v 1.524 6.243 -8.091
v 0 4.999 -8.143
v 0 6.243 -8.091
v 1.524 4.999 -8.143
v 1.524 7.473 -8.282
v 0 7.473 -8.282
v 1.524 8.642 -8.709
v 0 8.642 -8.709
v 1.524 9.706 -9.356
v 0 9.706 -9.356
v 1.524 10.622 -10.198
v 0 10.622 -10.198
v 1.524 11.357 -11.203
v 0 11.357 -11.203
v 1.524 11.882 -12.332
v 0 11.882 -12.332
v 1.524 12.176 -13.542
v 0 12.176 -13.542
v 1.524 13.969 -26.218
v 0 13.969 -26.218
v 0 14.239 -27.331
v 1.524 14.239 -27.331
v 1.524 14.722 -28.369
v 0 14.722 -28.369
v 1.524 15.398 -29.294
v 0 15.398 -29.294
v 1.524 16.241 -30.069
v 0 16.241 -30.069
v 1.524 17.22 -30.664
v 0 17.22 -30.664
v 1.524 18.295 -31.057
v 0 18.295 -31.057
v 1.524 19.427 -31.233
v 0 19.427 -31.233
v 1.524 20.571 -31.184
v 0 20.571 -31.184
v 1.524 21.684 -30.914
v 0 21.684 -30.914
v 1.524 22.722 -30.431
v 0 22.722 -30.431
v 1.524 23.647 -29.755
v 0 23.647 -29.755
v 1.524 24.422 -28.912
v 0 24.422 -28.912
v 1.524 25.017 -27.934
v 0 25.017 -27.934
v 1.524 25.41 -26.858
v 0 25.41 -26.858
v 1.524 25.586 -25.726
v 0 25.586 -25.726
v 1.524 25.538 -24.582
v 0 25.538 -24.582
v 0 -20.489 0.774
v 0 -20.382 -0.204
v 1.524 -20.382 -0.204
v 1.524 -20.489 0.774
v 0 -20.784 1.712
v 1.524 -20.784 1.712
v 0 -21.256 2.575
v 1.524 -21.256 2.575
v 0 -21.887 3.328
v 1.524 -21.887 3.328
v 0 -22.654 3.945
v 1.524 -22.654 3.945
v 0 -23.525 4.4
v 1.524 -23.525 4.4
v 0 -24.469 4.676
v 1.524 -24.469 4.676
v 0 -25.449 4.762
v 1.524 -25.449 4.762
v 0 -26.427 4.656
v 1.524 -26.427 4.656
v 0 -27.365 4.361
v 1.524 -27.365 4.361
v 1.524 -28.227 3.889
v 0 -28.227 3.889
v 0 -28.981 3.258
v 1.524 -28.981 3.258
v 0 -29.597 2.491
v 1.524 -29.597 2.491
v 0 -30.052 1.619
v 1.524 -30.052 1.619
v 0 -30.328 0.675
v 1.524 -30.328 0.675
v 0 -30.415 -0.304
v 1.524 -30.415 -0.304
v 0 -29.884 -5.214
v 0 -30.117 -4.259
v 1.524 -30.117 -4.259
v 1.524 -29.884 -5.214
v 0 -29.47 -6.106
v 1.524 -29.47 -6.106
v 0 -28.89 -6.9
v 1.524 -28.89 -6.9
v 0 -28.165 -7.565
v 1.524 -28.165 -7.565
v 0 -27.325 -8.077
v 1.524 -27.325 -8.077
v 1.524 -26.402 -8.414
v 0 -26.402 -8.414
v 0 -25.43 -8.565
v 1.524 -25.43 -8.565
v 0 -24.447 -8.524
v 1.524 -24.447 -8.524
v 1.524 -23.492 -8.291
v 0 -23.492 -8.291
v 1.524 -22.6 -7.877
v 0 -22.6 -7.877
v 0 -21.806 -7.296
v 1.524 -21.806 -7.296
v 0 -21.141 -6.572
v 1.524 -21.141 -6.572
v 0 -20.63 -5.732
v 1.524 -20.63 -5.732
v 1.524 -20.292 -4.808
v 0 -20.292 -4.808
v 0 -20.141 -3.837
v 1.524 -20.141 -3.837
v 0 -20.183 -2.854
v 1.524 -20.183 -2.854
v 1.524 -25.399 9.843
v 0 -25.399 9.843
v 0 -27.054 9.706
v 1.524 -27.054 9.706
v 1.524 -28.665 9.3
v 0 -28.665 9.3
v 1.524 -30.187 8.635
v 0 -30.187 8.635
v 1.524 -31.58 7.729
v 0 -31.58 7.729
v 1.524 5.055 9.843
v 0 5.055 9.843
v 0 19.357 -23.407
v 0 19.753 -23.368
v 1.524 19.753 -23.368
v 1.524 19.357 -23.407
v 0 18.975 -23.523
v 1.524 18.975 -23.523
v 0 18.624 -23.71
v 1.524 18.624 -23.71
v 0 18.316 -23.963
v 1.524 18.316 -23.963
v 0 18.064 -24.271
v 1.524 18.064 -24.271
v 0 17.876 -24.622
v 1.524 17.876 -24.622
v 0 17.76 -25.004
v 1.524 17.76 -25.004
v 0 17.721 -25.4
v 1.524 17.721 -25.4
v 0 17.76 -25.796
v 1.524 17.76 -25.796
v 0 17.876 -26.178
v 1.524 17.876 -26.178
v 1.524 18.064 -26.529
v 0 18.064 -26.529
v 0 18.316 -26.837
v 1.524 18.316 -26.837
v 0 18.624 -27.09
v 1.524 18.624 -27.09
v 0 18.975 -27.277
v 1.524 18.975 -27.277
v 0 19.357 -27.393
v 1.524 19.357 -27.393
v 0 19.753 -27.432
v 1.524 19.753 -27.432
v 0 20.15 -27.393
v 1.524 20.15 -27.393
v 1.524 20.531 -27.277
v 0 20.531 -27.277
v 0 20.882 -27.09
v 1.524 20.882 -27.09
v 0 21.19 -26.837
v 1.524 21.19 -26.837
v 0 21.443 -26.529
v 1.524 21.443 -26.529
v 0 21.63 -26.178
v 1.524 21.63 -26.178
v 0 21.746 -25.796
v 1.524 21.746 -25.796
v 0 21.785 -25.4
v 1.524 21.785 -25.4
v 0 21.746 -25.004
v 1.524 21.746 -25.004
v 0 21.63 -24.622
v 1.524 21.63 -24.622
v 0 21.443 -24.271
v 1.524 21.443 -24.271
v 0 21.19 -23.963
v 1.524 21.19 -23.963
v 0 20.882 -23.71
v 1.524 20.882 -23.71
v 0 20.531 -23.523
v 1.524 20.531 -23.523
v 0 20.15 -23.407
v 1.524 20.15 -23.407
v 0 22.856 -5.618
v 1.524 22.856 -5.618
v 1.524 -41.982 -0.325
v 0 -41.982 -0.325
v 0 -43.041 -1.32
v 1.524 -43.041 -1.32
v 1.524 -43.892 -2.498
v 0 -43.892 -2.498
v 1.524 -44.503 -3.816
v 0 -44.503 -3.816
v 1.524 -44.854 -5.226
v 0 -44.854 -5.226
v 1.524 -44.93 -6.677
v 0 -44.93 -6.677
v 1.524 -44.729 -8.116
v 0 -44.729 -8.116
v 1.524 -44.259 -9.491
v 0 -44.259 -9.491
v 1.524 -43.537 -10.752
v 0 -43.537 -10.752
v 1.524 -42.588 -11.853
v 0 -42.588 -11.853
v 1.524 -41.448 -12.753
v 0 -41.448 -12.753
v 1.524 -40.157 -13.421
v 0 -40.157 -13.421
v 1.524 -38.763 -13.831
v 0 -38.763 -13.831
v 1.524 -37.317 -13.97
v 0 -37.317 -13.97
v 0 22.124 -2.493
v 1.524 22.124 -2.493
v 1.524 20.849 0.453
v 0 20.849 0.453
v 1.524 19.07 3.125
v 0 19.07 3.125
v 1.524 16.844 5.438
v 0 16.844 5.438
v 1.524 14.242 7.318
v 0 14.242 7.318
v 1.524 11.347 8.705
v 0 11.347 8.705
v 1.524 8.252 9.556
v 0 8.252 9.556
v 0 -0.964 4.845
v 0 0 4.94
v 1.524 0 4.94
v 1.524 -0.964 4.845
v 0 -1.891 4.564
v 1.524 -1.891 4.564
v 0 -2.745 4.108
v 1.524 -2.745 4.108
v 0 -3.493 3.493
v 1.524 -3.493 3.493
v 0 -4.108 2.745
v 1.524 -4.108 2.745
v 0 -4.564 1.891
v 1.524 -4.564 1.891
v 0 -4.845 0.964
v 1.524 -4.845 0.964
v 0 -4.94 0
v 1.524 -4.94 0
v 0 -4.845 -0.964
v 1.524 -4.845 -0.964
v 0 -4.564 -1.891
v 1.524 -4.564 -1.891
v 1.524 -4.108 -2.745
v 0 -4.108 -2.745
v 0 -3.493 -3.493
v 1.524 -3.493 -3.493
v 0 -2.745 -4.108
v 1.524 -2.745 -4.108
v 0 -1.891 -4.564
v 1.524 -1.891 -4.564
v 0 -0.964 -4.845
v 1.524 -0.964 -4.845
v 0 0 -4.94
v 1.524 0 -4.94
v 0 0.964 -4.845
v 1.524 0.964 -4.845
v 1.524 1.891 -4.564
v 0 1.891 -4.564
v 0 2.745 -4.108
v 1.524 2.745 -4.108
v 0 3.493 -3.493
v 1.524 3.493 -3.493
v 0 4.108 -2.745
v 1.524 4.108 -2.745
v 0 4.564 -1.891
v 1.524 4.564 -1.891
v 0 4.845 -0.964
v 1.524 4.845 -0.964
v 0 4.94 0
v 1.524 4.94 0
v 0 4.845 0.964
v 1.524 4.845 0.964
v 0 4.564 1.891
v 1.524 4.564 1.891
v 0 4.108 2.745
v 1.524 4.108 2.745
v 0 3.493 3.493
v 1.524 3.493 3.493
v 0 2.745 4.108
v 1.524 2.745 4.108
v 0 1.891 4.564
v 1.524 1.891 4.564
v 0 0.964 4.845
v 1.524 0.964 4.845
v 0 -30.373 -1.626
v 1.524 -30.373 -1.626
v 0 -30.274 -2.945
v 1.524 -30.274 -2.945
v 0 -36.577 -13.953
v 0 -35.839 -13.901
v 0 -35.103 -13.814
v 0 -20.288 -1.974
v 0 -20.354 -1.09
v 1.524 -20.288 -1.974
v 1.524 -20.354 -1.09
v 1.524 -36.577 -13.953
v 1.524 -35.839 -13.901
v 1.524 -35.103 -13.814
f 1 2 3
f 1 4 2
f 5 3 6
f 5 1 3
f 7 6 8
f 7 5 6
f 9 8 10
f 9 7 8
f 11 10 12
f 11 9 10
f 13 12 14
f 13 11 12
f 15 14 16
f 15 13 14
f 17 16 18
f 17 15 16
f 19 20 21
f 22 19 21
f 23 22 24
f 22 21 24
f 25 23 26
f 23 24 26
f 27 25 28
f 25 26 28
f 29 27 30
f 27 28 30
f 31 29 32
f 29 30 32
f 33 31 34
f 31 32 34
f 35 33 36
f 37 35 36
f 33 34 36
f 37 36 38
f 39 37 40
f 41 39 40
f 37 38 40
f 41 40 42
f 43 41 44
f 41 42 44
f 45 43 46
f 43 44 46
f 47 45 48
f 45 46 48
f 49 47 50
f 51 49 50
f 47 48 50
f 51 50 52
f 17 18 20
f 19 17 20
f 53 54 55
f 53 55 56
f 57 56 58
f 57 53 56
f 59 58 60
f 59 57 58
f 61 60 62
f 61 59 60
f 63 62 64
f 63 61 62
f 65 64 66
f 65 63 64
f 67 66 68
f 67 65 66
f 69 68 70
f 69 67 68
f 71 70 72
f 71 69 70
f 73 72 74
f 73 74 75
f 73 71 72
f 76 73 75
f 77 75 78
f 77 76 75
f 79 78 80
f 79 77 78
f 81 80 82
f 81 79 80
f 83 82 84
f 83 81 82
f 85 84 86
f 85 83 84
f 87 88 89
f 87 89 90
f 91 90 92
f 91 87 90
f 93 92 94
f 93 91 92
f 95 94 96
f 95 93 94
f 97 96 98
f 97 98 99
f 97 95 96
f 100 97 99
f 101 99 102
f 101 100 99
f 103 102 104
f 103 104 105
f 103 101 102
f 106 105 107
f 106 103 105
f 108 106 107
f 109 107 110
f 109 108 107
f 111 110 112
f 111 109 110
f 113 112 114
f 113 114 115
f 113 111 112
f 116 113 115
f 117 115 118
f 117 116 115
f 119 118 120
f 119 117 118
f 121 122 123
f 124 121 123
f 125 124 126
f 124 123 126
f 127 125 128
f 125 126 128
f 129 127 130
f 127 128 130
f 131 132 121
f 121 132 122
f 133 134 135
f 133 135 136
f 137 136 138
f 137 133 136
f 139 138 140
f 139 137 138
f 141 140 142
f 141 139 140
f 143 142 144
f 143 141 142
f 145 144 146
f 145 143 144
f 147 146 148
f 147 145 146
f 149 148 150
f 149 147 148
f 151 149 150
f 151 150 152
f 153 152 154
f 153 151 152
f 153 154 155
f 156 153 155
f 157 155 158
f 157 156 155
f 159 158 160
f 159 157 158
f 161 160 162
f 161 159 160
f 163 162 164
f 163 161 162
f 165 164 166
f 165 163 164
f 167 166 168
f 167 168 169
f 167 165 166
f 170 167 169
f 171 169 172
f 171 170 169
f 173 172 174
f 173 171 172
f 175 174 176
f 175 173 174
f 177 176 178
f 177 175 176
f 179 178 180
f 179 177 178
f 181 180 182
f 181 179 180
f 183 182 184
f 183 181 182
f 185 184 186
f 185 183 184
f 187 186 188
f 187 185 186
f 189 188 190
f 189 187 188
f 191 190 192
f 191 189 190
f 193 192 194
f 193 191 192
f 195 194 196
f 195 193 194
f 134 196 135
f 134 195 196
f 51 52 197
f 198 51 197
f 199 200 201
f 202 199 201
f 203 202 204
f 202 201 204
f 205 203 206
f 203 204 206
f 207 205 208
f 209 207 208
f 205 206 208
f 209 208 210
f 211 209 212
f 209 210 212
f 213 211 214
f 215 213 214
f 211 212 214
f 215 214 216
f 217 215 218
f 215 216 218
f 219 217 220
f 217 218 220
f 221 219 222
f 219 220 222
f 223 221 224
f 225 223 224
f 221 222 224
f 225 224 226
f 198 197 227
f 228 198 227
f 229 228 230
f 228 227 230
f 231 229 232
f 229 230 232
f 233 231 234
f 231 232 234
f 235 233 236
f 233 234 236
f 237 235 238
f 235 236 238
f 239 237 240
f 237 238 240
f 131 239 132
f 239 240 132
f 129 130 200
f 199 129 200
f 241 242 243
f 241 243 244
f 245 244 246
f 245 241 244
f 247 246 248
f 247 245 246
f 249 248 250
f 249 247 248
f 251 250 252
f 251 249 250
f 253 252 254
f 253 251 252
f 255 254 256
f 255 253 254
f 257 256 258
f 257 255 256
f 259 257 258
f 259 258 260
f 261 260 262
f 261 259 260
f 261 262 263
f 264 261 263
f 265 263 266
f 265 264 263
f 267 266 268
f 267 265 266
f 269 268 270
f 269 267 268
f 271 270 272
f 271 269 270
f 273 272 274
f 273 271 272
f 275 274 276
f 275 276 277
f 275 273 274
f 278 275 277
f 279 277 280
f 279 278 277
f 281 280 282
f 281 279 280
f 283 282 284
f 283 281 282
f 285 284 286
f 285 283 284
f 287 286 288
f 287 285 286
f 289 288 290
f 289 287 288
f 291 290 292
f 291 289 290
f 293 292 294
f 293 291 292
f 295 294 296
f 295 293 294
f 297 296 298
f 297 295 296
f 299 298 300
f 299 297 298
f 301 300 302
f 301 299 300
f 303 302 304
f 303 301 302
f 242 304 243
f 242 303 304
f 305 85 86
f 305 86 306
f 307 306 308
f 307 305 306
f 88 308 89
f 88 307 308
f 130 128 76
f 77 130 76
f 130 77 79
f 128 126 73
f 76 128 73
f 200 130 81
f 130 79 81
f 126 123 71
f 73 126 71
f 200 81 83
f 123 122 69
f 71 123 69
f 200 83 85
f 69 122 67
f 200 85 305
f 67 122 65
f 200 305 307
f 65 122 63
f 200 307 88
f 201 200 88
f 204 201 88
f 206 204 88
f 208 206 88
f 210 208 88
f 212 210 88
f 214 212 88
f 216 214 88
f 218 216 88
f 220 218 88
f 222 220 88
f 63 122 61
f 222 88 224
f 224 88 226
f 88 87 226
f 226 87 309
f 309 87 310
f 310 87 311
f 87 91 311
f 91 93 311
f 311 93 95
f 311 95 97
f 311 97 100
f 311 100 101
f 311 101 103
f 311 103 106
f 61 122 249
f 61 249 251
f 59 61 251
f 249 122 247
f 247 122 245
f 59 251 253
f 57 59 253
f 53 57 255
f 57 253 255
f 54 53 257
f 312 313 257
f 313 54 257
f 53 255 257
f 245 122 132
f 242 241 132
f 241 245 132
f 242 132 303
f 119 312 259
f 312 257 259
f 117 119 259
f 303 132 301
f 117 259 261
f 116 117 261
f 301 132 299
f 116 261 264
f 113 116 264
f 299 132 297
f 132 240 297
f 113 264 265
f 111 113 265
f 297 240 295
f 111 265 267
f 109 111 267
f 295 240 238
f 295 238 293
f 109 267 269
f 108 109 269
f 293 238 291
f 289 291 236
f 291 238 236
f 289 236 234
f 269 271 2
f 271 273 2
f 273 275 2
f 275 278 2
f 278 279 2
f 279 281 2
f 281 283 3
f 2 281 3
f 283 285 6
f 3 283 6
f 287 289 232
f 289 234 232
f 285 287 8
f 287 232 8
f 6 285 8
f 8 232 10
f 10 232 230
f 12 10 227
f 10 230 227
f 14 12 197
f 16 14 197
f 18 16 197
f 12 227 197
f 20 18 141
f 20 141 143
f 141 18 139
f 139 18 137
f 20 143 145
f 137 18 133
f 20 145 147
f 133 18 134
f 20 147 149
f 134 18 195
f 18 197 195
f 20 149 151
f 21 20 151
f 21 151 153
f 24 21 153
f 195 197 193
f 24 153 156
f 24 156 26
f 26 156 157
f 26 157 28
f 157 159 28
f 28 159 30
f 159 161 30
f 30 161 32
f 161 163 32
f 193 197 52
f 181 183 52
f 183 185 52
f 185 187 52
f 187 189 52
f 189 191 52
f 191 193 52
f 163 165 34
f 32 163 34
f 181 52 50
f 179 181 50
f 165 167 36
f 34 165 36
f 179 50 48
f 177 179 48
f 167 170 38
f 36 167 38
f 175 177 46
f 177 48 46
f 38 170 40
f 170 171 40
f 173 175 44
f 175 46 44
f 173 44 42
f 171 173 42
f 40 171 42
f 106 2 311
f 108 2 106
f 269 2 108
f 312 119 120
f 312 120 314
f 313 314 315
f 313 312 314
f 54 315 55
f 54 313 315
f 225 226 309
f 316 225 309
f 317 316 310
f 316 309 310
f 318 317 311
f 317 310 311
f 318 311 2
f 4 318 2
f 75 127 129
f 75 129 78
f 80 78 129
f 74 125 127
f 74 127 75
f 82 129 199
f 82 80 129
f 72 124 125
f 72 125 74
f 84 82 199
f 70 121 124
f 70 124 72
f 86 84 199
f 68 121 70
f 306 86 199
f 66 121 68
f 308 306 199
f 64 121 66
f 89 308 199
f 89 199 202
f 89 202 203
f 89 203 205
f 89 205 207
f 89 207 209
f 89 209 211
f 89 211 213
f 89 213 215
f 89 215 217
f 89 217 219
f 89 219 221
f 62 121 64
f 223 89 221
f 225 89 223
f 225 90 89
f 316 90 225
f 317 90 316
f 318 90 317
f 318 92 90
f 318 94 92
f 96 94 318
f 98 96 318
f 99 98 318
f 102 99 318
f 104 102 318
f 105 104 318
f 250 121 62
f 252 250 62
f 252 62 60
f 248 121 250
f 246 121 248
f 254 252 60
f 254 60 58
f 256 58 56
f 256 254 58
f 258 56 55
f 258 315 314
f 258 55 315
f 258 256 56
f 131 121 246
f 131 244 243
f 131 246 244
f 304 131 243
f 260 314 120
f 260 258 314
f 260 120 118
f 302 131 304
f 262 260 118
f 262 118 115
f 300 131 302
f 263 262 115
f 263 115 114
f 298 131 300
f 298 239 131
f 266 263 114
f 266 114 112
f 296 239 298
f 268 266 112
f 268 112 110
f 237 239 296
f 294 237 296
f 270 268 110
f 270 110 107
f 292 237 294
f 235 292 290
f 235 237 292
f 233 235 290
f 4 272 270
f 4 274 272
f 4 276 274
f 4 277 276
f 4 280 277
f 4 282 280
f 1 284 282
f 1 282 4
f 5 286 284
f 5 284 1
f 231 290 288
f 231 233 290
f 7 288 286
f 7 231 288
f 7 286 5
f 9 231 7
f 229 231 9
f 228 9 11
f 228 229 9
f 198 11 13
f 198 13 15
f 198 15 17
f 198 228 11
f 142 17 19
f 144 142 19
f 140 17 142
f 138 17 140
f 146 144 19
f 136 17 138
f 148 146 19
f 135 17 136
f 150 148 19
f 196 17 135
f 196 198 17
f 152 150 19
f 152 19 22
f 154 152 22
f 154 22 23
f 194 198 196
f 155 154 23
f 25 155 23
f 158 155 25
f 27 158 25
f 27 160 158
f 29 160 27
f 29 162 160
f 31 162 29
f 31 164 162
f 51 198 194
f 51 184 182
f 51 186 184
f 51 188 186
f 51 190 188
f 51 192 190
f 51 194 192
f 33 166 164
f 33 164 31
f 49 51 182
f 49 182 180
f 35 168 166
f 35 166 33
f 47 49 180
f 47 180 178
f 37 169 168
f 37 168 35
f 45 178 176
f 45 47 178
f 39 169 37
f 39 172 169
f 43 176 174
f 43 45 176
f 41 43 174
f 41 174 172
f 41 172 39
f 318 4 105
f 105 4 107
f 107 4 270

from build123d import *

# Parameters (mm, degrees)
SKETCH1_R           = 4.9403
SKETCH1_R_2         = 2.032
BOSS_EXTRUDE1_DEPTH = 1.524
FILLET1_R           = 6.35


with BuildPart() as part:
    # Sketch1 → Boss-Extrude1 (new body)
    with BuildSketch(Plane(origin=(0, 0, 0), x_dir=(0, 0, -1), z_dir=(1, 0, 0))):
        with BuildLine():
            Line((13.8142694, -35.103404086), (7.254069056, 11.286906181))
            Line((7.254069056, 11.286906181), (26.217997141, 13.968655167))
            ThreePointArc((26.217997141, 13.968655167), (31.18444852, 20.571100828), (24.582002859, 25.537552207))
            Line((24.582002859, 25.537552207), (5.618074774, 22.85580322))
            ThreePointArc((5.618074774, 22.85580322), (-5.437755223, 16.843791056), (-9.842503175, 5.055073455))
            Line((-9.842503175, 5.055073455), (-9.842503175, -25.39873))
            ThreePointArc((-9.842503175, -25.39873), (-9.299571879, -28.665017997), (-7.729169391, -31.580021889))
            Line((-7.729169391, -31.580021889), (0.324968894, -41.98197763))
            ThreePointArc((0.324968894, -41.98197763), (8.815123016, -44.527092206), (13.97, -37.316851675))
            ThreePointArc((13.97, -37.316851675), (13.931019289, -36.207392094), (13.8142694, -35.103404086))
        make_face()
        with Locations(Location((0, 0, 0), (0, 0, 180))):
            Circle(SKETCH1_R, mode=Mode.SUBTRACT)
        with Locations(Location((25.4, 19.753103687, 0), (0, 0, 180))):
            Circle(SKETCH1_R_2, mode=Mode.SUBTRACT)
        with BuildLine():
            ThreePointArc((0.304161198, -30.414979175), (2.286404707, -30.330443877), (4.258919897, -30.116856967))
            ThreePointArc((4.258919897, -30.116856967), (8.523590103, -24.447365584), (2.85409872, -20.182695379))
            ThreePointArc((2.85409872, -20.182695379), (1.532225284, -20.325829821), (0.203832452, -20.382480825))
            ThreePointArc((0.203832452, -20.382480825), (-4.76225235, -25.448894373), (0.304161198, -30.414979175))
        make_face(mode=Mode.SUBTRACT)
    extrude(amount=BOSS_EXTRUDE1_DEPTH)

    # Fillet1
    fillet1_edges = [part.edges().sort_by_distance(p)[0] for p in [
        (0.762, 11.286906181, -7.254069056),
    ]]
    fillet(fillet1_edges, radius=FILLET1_R)


solid = part.part
